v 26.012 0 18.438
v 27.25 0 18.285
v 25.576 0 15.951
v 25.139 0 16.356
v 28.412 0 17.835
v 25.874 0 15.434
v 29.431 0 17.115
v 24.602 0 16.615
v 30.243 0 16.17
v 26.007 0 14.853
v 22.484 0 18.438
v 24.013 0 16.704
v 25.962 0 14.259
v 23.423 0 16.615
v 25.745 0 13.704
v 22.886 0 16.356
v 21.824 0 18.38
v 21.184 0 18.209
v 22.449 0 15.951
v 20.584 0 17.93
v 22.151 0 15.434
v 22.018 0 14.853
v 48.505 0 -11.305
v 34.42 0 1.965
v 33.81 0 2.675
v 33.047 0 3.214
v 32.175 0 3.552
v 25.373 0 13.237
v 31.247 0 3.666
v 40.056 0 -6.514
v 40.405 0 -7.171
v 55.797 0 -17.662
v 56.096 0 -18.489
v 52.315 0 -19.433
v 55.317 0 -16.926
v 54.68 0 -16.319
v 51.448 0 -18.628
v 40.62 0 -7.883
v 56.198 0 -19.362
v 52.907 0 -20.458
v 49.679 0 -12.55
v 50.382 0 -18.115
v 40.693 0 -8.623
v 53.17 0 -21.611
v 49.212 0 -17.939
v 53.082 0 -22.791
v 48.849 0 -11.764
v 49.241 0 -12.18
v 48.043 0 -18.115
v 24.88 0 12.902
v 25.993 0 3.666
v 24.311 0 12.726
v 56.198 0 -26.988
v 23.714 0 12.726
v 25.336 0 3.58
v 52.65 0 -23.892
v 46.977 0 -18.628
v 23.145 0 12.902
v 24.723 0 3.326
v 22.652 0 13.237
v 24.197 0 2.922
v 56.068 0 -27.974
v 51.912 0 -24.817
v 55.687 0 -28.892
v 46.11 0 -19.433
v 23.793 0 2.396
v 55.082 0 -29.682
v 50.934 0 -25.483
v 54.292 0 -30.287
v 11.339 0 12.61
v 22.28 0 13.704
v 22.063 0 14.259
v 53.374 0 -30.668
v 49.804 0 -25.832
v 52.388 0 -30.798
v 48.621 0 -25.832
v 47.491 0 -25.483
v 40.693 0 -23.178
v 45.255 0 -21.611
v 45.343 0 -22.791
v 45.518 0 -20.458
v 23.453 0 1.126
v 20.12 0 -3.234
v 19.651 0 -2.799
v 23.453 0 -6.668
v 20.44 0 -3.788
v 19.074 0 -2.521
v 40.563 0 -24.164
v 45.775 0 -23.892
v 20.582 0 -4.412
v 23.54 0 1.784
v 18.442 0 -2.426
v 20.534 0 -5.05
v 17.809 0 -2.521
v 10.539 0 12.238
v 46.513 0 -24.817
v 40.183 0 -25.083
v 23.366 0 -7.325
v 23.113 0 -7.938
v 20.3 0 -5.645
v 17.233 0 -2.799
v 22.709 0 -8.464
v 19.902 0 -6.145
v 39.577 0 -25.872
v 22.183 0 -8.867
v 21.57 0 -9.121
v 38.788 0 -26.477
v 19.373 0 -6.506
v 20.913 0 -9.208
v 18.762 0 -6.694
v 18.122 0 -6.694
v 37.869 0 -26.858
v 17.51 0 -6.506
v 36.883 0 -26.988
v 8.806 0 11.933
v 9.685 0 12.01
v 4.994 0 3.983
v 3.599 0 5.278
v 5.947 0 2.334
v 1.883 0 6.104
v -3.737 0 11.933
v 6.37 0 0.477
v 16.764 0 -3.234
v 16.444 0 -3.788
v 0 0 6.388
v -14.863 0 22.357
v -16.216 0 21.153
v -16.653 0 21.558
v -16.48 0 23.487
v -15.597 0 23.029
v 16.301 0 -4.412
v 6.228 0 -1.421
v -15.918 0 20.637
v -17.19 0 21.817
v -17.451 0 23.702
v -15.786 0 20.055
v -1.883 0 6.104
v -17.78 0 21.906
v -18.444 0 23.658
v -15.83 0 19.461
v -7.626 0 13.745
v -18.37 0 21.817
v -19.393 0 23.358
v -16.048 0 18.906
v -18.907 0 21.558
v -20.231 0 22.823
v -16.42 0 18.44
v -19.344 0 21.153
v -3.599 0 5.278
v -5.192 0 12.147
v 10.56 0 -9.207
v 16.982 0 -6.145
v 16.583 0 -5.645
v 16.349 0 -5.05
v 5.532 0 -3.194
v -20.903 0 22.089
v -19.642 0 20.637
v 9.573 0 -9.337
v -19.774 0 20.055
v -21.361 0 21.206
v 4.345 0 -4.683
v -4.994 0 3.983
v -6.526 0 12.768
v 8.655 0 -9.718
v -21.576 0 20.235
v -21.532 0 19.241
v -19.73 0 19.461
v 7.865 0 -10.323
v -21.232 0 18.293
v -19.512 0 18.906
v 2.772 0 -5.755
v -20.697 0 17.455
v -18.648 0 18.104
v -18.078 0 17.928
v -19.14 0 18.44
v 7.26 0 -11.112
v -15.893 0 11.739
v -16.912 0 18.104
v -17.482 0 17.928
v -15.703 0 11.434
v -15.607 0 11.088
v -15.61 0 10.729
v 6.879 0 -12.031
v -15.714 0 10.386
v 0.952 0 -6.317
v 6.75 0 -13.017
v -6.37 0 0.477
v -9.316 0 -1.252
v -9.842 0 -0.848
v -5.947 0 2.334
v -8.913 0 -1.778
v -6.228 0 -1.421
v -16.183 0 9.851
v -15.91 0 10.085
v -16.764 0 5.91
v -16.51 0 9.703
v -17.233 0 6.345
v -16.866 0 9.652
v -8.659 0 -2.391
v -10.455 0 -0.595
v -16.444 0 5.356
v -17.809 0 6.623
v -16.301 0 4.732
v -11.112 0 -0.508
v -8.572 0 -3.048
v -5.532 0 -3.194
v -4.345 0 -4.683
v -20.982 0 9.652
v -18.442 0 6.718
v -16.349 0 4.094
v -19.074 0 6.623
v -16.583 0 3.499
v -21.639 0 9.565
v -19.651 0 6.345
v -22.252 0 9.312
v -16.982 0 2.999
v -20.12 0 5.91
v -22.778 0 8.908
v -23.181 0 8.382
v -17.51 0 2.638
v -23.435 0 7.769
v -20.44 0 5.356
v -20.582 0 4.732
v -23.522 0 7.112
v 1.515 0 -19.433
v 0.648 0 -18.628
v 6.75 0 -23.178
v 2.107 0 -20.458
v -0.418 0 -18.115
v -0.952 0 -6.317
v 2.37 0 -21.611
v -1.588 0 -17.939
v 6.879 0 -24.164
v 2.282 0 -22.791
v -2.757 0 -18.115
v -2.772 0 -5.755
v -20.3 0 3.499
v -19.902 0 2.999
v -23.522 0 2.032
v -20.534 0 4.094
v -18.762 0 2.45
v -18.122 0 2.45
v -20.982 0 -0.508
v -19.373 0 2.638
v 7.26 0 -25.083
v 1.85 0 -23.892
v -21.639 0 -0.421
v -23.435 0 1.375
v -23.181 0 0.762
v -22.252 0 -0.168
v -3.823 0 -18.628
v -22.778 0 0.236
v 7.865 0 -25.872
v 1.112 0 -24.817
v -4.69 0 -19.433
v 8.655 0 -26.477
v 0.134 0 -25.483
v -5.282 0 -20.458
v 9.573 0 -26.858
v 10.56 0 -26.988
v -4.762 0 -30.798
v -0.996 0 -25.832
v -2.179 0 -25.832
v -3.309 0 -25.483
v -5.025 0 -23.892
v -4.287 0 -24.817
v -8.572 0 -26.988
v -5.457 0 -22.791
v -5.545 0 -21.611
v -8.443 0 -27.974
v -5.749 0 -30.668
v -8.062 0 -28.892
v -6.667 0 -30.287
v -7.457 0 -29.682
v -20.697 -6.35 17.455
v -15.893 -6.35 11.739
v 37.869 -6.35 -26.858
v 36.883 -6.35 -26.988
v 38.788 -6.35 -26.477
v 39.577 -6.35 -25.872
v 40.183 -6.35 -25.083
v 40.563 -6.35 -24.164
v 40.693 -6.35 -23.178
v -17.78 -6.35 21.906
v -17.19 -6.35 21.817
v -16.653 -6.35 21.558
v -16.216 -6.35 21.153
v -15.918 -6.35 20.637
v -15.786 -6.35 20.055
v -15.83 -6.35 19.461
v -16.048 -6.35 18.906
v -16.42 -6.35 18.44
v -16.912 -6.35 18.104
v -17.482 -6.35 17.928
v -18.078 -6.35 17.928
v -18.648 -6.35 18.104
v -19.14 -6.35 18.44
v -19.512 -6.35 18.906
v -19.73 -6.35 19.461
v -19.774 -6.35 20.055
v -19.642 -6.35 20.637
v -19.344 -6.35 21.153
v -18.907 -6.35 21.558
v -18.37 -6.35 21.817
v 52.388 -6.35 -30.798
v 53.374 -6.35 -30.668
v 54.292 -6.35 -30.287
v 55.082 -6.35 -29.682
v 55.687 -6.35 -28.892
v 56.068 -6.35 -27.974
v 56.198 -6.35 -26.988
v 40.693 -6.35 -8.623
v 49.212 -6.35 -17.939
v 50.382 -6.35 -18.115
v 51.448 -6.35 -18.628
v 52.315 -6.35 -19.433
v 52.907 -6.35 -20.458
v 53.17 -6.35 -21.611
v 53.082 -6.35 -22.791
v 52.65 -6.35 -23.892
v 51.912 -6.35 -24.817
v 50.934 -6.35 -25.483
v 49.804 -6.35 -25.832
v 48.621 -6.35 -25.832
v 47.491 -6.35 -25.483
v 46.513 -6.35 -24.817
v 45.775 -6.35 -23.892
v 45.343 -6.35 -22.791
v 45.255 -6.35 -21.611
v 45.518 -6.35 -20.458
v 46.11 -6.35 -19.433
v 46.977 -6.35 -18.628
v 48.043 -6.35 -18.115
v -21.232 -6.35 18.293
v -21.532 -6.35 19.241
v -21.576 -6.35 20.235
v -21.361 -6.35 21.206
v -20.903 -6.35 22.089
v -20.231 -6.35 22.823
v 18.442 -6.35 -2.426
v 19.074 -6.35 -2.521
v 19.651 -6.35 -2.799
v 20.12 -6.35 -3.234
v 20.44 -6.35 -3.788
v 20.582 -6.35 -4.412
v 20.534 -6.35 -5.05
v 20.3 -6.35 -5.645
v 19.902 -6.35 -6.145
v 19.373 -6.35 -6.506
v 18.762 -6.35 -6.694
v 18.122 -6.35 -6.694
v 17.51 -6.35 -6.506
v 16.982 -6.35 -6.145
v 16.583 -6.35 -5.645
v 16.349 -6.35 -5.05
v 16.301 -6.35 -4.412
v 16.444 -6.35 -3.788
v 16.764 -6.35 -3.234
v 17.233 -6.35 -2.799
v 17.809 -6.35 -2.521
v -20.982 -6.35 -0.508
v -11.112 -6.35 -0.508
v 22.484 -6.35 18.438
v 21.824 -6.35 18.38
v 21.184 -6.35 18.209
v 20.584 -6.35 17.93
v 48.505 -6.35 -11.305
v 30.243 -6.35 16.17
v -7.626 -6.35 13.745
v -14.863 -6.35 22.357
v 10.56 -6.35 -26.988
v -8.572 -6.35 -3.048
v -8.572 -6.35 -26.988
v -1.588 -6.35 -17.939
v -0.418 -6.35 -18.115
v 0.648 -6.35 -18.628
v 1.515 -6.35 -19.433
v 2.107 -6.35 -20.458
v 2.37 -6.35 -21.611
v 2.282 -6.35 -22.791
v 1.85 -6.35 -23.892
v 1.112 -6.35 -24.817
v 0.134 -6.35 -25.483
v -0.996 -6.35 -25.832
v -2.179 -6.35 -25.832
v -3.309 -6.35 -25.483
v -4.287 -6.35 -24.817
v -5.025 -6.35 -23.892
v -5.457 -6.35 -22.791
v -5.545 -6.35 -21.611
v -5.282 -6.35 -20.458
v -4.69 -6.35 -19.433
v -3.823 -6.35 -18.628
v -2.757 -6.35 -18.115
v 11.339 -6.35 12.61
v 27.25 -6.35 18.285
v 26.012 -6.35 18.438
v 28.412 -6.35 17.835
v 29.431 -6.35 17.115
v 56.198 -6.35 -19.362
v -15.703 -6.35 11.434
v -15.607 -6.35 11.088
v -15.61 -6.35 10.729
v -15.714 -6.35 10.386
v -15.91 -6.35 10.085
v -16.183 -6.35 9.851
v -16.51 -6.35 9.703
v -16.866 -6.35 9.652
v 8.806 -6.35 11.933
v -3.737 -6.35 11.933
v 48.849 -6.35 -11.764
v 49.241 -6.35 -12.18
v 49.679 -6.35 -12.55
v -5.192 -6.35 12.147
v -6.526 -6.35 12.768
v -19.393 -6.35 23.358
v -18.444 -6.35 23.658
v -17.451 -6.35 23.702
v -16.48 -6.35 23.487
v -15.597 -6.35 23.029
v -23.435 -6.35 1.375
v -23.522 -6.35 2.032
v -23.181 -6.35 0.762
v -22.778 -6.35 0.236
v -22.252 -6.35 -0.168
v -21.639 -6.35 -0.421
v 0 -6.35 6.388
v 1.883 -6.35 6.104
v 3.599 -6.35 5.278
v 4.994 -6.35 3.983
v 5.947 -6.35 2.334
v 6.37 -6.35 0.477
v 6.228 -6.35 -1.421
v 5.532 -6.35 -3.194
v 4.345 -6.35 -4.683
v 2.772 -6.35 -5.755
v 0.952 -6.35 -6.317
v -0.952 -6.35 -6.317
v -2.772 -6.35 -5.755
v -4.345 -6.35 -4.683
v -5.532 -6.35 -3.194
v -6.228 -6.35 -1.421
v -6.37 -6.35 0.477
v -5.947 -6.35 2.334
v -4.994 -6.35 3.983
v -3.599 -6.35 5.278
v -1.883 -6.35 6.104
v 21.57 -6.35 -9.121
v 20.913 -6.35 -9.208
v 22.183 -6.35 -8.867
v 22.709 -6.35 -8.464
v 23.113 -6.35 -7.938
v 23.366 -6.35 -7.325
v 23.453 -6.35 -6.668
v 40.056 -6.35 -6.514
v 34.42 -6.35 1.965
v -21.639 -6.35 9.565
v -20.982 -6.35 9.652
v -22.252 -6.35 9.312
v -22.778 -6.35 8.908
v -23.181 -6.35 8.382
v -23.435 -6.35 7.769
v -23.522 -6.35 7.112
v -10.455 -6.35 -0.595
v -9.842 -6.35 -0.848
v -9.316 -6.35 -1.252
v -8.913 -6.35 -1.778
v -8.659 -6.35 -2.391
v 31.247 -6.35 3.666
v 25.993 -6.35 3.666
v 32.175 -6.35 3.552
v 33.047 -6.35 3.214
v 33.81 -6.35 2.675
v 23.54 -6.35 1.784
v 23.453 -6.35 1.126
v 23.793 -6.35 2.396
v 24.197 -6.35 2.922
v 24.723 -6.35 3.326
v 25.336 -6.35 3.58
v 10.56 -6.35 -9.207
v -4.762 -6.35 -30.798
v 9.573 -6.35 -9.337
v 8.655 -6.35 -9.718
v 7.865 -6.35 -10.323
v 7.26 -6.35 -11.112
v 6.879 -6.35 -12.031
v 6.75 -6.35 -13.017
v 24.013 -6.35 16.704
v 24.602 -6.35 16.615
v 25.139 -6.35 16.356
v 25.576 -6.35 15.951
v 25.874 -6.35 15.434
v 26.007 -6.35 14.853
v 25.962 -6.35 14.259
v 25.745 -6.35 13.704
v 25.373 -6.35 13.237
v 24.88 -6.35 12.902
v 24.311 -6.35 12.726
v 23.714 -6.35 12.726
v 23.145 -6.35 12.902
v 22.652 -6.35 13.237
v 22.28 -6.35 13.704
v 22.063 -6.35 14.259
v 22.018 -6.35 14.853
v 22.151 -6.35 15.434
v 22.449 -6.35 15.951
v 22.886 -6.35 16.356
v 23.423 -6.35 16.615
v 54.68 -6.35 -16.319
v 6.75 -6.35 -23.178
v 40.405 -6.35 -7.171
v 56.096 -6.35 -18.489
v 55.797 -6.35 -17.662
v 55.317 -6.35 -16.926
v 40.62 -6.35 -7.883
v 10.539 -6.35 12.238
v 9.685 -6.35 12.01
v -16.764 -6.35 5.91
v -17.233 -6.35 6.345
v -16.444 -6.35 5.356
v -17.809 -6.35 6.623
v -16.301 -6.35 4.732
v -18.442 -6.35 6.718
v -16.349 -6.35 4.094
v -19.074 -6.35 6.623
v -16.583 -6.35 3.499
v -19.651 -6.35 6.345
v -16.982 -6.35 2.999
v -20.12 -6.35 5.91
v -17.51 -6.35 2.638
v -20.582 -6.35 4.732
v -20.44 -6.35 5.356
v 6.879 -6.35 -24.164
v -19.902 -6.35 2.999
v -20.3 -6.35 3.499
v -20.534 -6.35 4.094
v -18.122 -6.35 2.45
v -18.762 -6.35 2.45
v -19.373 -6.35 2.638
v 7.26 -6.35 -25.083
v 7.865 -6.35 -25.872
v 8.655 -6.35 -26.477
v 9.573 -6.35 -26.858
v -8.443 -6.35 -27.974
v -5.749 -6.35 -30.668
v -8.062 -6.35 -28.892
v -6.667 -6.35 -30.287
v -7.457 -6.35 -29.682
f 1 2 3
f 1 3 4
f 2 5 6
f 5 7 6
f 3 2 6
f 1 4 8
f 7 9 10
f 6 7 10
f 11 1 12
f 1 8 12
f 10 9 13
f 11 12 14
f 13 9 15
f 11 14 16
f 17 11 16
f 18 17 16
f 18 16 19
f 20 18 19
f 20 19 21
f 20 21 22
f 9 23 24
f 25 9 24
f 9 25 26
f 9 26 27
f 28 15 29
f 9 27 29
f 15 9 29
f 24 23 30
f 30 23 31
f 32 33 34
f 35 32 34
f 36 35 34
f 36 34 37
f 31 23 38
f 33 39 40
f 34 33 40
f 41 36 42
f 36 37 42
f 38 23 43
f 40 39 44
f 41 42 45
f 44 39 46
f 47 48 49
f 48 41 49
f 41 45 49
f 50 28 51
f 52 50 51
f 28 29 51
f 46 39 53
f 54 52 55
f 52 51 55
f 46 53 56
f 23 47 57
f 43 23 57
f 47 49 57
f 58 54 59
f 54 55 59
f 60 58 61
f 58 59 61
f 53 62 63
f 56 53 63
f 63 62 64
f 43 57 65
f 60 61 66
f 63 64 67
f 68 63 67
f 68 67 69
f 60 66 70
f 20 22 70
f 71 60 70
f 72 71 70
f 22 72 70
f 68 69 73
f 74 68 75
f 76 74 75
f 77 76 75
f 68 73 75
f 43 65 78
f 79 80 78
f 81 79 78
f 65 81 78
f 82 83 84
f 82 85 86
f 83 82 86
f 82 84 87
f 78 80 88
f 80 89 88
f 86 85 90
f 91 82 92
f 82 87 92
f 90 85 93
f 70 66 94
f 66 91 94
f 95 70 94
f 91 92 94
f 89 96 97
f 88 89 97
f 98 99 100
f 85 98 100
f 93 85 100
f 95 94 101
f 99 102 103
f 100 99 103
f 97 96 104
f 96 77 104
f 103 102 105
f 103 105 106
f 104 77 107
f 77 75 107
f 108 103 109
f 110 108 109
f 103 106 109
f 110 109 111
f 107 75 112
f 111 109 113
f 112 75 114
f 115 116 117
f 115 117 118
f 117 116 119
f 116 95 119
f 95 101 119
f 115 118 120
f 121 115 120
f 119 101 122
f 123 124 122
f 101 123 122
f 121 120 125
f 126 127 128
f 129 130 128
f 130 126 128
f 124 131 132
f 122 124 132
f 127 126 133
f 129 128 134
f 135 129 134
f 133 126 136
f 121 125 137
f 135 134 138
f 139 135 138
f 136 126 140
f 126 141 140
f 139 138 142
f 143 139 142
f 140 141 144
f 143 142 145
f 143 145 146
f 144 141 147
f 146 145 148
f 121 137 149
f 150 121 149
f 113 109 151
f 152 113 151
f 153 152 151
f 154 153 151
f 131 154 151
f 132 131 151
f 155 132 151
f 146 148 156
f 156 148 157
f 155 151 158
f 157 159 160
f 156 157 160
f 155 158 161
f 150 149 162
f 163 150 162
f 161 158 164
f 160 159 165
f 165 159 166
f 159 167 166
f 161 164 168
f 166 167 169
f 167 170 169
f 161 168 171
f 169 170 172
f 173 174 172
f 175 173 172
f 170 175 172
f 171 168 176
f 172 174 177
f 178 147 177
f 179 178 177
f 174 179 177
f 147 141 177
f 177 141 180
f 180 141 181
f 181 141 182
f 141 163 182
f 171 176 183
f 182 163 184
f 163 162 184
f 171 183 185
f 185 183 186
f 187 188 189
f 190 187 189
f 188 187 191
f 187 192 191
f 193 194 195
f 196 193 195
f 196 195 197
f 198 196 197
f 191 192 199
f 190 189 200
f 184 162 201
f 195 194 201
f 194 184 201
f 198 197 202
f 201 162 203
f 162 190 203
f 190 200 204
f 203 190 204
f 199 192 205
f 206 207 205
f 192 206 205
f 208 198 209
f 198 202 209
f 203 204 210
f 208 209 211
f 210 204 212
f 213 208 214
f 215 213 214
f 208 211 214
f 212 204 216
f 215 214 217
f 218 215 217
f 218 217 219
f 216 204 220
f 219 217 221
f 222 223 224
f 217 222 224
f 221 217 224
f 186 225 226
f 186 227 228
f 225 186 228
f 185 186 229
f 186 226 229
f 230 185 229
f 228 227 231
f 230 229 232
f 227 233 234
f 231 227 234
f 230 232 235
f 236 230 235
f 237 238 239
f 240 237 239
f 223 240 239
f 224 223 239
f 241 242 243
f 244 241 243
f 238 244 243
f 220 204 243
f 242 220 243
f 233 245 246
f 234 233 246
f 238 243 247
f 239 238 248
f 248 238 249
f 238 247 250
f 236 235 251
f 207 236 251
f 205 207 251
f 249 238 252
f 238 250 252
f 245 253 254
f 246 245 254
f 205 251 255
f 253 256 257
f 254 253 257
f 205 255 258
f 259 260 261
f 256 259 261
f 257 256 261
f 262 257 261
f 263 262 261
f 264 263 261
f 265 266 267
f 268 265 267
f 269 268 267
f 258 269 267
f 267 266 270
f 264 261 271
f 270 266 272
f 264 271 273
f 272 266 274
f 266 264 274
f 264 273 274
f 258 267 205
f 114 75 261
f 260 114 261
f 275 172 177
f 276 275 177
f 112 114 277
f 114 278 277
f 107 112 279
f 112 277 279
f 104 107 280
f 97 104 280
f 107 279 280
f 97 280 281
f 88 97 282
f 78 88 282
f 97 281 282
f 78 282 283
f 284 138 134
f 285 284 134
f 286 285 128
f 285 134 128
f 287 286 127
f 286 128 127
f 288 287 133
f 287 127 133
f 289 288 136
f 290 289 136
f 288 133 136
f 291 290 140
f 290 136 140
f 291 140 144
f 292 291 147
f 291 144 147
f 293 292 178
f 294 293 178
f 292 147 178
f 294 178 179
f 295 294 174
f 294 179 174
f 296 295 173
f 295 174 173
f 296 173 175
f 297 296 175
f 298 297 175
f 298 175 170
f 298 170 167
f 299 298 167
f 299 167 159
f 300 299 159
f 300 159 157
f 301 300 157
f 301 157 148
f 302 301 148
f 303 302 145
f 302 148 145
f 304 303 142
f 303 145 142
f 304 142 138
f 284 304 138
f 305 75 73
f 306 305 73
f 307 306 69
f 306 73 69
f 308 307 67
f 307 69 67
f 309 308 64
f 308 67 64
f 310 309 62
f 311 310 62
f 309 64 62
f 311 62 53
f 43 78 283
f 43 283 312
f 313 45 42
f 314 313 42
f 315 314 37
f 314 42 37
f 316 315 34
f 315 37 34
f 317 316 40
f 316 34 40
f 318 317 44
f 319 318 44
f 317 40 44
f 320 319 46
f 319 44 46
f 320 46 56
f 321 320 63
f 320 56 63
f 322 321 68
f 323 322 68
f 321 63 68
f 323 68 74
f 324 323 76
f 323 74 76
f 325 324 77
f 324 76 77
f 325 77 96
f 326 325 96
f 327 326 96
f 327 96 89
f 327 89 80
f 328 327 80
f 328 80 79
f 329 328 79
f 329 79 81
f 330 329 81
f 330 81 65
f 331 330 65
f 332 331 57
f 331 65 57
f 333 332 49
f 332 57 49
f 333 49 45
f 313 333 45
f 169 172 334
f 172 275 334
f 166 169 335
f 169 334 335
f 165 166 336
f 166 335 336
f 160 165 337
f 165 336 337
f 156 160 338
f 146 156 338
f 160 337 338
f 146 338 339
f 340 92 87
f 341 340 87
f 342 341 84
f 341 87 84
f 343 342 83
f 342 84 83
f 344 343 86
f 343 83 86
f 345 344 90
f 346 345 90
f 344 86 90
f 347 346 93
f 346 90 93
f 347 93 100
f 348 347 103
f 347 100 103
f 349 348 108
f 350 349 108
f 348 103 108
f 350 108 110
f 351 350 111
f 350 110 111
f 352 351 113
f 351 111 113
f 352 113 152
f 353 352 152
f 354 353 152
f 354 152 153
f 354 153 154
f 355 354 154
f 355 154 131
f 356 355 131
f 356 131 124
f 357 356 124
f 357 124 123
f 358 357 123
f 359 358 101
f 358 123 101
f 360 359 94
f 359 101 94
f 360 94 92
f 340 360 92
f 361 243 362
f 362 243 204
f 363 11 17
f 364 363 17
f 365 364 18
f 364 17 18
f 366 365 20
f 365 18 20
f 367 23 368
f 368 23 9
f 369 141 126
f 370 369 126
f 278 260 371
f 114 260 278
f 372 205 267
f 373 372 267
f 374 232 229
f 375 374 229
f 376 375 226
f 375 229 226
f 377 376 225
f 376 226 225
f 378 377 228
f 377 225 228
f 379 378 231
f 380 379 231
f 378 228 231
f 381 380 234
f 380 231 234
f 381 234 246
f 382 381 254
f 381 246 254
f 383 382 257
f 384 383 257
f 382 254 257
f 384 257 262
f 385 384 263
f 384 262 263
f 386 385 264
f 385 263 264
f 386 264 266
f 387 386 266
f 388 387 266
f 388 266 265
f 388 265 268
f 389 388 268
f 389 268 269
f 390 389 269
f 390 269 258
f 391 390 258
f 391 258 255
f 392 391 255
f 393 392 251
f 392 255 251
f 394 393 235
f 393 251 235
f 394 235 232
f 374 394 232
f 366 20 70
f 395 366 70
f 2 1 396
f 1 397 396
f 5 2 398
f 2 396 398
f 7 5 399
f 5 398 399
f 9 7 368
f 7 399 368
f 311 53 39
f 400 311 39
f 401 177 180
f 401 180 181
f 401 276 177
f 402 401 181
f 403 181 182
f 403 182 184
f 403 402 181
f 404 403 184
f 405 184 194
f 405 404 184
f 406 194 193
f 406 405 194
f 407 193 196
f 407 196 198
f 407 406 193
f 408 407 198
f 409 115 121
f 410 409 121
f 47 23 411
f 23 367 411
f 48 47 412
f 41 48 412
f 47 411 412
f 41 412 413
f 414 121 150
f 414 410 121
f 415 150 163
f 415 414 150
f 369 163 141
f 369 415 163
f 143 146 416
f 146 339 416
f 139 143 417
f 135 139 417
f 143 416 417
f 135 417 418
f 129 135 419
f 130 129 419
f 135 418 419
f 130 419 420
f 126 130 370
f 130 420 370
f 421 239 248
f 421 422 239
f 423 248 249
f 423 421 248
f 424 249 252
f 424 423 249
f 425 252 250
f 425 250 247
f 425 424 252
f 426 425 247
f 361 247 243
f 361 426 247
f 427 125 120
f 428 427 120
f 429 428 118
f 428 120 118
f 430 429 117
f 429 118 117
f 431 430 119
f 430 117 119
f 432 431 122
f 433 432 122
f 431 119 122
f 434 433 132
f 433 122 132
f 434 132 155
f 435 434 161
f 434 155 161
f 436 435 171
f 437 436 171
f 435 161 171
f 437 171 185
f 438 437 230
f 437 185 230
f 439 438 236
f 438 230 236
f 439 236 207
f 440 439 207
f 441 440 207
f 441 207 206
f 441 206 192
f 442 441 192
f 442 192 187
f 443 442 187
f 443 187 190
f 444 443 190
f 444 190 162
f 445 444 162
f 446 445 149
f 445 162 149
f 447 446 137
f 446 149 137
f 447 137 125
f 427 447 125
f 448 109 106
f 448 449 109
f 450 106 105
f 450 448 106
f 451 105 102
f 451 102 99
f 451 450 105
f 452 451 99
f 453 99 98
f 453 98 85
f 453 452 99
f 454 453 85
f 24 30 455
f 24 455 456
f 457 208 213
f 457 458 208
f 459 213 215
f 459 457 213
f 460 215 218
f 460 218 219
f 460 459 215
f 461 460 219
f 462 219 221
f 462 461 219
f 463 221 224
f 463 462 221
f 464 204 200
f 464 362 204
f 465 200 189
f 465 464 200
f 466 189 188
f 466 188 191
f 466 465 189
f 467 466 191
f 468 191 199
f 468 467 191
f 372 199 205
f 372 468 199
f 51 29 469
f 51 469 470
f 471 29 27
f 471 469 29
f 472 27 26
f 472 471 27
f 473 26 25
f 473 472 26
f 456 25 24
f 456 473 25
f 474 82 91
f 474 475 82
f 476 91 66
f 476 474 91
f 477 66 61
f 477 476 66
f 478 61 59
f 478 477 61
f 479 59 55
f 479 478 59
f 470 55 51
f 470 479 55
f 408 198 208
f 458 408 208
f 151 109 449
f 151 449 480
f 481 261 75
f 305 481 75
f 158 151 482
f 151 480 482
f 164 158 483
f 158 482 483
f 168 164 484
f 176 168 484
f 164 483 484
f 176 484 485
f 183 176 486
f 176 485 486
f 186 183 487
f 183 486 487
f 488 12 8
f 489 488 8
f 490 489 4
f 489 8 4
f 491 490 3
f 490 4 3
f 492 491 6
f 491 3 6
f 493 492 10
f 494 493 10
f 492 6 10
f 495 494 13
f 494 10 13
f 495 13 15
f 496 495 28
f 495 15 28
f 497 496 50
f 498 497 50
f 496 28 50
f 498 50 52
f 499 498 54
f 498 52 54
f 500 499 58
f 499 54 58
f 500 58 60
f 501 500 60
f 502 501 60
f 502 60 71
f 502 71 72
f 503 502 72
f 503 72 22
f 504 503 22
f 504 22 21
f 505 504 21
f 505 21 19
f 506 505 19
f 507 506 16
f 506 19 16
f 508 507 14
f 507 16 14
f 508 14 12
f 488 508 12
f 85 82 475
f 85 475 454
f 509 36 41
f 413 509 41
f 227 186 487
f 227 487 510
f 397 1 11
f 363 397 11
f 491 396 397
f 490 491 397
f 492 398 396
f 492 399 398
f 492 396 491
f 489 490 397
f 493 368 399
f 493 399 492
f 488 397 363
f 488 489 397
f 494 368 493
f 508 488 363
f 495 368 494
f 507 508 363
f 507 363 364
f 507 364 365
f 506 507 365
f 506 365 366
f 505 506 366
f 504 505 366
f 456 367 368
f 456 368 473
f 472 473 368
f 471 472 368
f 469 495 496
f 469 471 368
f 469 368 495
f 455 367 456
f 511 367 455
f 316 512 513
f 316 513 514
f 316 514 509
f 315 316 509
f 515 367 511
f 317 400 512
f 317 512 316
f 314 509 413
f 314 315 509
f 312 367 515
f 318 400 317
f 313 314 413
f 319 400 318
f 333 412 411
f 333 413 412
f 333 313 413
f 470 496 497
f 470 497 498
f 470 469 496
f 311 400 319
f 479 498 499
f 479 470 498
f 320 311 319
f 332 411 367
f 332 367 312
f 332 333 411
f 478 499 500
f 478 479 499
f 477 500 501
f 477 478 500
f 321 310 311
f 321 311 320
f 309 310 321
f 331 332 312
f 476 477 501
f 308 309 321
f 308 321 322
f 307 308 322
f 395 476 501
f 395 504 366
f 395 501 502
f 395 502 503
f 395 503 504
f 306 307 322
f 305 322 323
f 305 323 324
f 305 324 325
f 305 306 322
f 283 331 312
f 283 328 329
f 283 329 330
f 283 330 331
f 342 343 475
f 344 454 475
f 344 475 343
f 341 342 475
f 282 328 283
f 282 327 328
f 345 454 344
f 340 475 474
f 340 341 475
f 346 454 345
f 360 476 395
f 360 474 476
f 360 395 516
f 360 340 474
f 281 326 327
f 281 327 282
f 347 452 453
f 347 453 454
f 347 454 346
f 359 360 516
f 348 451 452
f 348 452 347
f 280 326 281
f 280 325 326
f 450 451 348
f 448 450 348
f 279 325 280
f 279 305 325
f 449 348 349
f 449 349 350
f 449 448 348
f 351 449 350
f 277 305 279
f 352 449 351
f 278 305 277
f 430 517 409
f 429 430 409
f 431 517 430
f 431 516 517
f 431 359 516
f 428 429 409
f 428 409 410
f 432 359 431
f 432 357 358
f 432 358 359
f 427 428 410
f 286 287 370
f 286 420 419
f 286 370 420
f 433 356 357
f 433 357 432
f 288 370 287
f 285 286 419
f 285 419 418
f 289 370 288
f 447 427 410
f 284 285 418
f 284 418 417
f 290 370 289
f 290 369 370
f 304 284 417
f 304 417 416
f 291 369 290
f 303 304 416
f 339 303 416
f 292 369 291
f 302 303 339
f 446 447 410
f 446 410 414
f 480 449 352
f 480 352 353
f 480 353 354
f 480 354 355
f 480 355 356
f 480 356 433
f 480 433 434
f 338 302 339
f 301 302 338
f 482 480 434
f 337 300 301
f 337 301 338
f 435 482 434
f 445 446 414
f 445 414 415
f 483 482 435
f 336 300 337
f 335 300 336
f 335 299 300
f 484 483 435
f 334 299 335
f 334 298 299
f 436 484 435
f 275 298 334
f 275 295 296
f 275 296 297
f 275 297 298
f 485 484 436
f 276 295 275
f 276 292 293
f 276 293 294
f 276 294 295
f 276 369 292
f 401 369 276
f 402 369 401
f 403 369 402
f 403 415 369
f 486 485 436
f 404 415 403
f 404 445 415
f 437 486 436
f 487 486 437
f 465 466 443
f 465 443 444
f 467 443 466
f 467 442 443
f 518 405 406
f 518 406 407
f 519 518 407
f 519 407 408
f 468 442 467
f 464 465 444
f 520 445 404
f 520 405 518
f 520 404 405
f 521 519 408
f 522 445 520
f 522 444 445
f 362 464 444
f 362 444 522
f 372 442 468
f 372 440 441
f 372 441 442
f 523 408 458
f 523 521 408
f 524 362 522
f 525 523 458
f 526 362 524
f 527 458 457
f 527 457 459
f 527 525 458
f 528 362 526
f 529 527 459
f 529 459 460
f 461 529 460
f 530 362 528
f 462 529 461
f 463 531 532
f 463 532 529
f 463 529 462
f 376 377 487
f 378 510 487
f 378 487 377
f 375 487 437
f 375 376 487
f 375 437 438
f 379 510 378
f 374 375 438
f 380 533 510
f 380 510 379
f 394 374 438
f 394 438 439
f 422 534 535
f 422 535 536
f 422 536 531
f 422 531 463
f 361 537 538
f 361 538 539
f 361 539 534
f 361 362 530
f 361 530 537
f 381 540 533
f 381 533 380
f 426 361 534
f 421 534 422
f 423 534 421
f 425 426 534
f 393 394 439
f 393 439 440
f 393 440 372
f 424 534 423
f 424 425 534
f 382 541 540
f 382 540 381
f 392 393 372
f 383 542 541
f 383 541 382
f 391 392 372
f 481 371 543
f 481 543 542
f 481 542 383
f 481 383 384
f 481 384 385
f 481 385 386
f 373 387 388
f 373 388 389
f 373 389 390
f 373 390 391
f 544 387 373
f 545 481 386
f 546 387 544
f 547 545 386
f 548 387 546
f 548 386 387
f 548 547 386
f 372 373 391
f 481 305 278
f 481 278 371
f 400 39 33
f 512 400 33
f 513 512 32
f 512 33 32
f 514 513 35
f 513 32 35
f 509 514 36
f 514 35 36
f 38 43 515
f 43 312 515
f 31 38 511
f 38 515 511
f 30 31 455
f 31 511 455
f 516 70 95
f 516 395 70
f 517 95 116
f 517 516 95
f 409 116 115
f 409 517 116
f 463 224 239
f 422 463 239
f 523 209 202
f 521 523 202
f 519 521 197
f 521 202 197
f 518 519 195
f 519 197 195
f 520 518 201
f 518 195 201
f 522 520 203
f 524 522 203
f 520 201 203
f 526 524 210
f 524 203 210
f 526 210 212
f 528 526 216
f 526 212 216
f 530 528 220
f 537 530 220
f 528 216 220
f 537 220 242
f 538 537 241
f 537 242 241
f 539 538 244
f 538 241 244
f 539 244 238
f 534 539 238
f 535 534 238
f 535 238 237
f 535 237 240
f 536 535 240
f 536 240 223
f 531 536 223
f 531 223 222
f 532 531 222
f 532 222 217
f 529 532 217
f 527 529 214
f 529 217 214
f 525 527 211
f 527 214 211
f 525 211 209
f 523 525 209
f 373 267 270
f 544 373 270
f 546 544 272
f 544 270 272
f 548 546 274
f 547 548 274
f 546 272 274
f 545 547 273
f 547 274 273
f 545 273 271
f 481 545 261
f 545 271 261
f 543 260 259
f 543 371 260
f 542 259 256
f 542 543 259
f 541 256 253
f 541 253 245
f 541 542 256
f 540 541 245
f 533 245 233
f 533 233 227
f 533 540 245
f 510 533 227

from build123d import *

# Parameters (mm, degrees)
SKETCH4_R           = 6.3881
SKETCH4_R_2         = 3.96875
SKETCH4_R_3         = 2
SKETCH4_R_4         = 2.1463
BOSS_EXTRUDE2_DEPTH = 6.35
FILLET1_R           = 5.08
FILLET7_R           = 3.81
FILLET9_R           = 5.08
FILLET10_R          = 1.27
FILLET11_R          = 3.81
FILLET12_R          = 2.54
FILLET13_R          = 3.81


with BuildPart() as part:
    # Sketch4 → Boss-Extrude2 (new body)
    with BuildSketch(Plane(origin=(0, 0, 0), x_dir=(1, 0, 0), z_dir=(0, 1, 0))):
        with BuildLine():
            Line((28.735494078, -18.4375), (22.483900583, -18.4375))
            ThreePointArc((22.483900583, -18.4375), (21.500464498, -18.308390309), (20.583679925, -17.929811531))
            Line((20.583679925, -17.929811531), (10.16293305, -11.933490986))
            Line((10.16293305, -11.933490986), (-6.103062549, -11.933490986))
            Line((-6.103062549, -11.933490986), (-17.314513469, -25.273959881))
            Line((-17.314513469, -25.273959881), (-23.148009155, -20.371437257))
            Line((-23.148009155, -20.371437257), (-14.139296969, -9.652))
            Line((-14.139296969, -9.652), (-23.52171402, -9.652))
            Line((-23.52171402, -9.652), (-23.52171402, 0.508))
            Line((-23.52171402, 0.508), (-8.5725, 0.508))
            Line((-8.5725, 0.508), (-8.5725, 12.607500122))
            Line((-8.5725, 12.607500122), (-8.5725, 26.9875))
            ThreePointArc((-8.5725, 26.9875), (-7.456576836, 29.681576836), (-4.7625, 30.7975))
            Line((-4.7625, 30.7975), (52.3875, 30.7975))
            ThreePointArc((52.3875, 30.7975), (55.081576836, 29.681576836), (56.1975, 26.9875))
            Line((56.1975, 26.9875), (56.1975, 19.362095927))
            ThreePointArc((56.1975, 19.362095927), (55.797199918, 17.662082259), (54.680415238, 16.319294633))
            Line((54.680415238, 16.319294633), (48.985566477, 12.027918285))
            Line((48.985566477, 12.027918285), (28.735494078, -18.4375))
        make_face()
        with Locations(Location((0, 0, 0), (0, 0, 270))):
            Circle(SKETCH4_R, mode=Mode.SUBTRACT)
        with Locations(Location((-1.5875, 21.9075, 0), (0, 0, 270))):
            Circle(SKETCH4_R_2, mode=Mode.SUBTRACT)
        with Locations(Location((49.2125, 21.9075, 0), (0, 0, 270))):
            Circle(SKETCH4_R_2, mode=Mode.SUBTRACT)
        with Locations(Location((24.012521227, -14.703599027, 0), (0, 0, 270))):
            Circle(SKETCH4_R_3, mode=Mode.SUBTRACT)
        with Locations(Location((-17.78, -19.905950726, 0), (0, 0, 270))):
            Circle(SKETCH4_R_3, mode=Mode.SUBTRACT)
        with Locations(Location((18.44171402, 4.572, 0), (0, 0, 270))):
            Circle(SKETCH4_R_4, mode=Mode.SUBTRACT)
        with Locations(Location((-18.44171402, -4.572, 0), (0, 0, 270))):
            Circle(SKETCH4_R_4, mode=Mode.SUBTRACT)
        Polygon((6.749565973, 26.9875), (40.692955064, 26.9875), (40.692955064, 7.472580753), (33.28904903, -3.666297657), (23.452955064, -3.666297657), (23.452955064, 9.2075), (6.749565973, 9.2075), align=None, mode=Mode.SUBTRACT)
    extrude(amount=-BOSS_EXTRUDE2_DEPTH)

    # Fillet1
    fillet1_edges = [part.edges().sort_by_distance(p)[0] for p in [
        (48.985566477, -3.175, -12.027918285),
        (28.735494078, -3.175, 18.4375),
    ]]
    fillet(fillet1_edges, radius=FILLET1_R)

    # Fillet7
    fillet7_edges = [part.edges().sort_by_distance(p)[0] for p in [
        (40.692955064, -3.175, -7.472580753),
        (40.692955064, -3.175, -26.9875),
        (6.749565973, -3.175, -26.9875),
        (6.749565973, -3.175, -9.2075),
    ]]
    fillet(fillet7_edges, radius=FILLET7_R)

    # Fillet9
    fillet9_edges = [part.edges().sort_by_distance(p)[0] for p in [
        (10.16293305, -3.175, 11.933490986),
        (-6.103062549, -3.175, 11.933490986),
    ]]
    fillet(fillet9_edges, radius=FILLET9_R)

    # Fillet10
    fillet10_edges = [part.edges().sort_by_distance(p)[0] for p in [
        (-14.139296969, -3.175, 9.652),
    ]]
    fillet(fillet10_edges, radius=FILLET10_R)

    # Fillet11
    fillet11_edges = [part.edges().sort_by_distance(p)[0] for p in [
        (-17.314513469, -3.175, 25.273959881),
        (-23.148009155, -3.175, 20.371437257),
    ]]
    fillet(fillet11_edges, radius=FILLET11_R - 0.0001)  # a hair under: the kernel refuses the full size

    # Fillet12
    fillet12_edges = [part.edges().sort_by_distance(p)[0] for p in [
        (23.452955064, -3.175, -9.2075),
        (23.452955064, -3.175, 3.666297657),
        (-23.52171402, -3.175, 9.652),
        (-23.52171402, -3.175, -0.508),
        (-8.5725, -3.175, -0.508),
    ]]
    fillet(fillet12_edges, radius=FILLET12_R)

    # Fillet13
    fillet13_edges = [part.edges().sort_by_distance(p)[0] for p in [
        (33.28904903, -3.175, 3.666297657),
    ]]
    fillet(fillet13_edges, radius=FILLET13_R)


solid = part.part
